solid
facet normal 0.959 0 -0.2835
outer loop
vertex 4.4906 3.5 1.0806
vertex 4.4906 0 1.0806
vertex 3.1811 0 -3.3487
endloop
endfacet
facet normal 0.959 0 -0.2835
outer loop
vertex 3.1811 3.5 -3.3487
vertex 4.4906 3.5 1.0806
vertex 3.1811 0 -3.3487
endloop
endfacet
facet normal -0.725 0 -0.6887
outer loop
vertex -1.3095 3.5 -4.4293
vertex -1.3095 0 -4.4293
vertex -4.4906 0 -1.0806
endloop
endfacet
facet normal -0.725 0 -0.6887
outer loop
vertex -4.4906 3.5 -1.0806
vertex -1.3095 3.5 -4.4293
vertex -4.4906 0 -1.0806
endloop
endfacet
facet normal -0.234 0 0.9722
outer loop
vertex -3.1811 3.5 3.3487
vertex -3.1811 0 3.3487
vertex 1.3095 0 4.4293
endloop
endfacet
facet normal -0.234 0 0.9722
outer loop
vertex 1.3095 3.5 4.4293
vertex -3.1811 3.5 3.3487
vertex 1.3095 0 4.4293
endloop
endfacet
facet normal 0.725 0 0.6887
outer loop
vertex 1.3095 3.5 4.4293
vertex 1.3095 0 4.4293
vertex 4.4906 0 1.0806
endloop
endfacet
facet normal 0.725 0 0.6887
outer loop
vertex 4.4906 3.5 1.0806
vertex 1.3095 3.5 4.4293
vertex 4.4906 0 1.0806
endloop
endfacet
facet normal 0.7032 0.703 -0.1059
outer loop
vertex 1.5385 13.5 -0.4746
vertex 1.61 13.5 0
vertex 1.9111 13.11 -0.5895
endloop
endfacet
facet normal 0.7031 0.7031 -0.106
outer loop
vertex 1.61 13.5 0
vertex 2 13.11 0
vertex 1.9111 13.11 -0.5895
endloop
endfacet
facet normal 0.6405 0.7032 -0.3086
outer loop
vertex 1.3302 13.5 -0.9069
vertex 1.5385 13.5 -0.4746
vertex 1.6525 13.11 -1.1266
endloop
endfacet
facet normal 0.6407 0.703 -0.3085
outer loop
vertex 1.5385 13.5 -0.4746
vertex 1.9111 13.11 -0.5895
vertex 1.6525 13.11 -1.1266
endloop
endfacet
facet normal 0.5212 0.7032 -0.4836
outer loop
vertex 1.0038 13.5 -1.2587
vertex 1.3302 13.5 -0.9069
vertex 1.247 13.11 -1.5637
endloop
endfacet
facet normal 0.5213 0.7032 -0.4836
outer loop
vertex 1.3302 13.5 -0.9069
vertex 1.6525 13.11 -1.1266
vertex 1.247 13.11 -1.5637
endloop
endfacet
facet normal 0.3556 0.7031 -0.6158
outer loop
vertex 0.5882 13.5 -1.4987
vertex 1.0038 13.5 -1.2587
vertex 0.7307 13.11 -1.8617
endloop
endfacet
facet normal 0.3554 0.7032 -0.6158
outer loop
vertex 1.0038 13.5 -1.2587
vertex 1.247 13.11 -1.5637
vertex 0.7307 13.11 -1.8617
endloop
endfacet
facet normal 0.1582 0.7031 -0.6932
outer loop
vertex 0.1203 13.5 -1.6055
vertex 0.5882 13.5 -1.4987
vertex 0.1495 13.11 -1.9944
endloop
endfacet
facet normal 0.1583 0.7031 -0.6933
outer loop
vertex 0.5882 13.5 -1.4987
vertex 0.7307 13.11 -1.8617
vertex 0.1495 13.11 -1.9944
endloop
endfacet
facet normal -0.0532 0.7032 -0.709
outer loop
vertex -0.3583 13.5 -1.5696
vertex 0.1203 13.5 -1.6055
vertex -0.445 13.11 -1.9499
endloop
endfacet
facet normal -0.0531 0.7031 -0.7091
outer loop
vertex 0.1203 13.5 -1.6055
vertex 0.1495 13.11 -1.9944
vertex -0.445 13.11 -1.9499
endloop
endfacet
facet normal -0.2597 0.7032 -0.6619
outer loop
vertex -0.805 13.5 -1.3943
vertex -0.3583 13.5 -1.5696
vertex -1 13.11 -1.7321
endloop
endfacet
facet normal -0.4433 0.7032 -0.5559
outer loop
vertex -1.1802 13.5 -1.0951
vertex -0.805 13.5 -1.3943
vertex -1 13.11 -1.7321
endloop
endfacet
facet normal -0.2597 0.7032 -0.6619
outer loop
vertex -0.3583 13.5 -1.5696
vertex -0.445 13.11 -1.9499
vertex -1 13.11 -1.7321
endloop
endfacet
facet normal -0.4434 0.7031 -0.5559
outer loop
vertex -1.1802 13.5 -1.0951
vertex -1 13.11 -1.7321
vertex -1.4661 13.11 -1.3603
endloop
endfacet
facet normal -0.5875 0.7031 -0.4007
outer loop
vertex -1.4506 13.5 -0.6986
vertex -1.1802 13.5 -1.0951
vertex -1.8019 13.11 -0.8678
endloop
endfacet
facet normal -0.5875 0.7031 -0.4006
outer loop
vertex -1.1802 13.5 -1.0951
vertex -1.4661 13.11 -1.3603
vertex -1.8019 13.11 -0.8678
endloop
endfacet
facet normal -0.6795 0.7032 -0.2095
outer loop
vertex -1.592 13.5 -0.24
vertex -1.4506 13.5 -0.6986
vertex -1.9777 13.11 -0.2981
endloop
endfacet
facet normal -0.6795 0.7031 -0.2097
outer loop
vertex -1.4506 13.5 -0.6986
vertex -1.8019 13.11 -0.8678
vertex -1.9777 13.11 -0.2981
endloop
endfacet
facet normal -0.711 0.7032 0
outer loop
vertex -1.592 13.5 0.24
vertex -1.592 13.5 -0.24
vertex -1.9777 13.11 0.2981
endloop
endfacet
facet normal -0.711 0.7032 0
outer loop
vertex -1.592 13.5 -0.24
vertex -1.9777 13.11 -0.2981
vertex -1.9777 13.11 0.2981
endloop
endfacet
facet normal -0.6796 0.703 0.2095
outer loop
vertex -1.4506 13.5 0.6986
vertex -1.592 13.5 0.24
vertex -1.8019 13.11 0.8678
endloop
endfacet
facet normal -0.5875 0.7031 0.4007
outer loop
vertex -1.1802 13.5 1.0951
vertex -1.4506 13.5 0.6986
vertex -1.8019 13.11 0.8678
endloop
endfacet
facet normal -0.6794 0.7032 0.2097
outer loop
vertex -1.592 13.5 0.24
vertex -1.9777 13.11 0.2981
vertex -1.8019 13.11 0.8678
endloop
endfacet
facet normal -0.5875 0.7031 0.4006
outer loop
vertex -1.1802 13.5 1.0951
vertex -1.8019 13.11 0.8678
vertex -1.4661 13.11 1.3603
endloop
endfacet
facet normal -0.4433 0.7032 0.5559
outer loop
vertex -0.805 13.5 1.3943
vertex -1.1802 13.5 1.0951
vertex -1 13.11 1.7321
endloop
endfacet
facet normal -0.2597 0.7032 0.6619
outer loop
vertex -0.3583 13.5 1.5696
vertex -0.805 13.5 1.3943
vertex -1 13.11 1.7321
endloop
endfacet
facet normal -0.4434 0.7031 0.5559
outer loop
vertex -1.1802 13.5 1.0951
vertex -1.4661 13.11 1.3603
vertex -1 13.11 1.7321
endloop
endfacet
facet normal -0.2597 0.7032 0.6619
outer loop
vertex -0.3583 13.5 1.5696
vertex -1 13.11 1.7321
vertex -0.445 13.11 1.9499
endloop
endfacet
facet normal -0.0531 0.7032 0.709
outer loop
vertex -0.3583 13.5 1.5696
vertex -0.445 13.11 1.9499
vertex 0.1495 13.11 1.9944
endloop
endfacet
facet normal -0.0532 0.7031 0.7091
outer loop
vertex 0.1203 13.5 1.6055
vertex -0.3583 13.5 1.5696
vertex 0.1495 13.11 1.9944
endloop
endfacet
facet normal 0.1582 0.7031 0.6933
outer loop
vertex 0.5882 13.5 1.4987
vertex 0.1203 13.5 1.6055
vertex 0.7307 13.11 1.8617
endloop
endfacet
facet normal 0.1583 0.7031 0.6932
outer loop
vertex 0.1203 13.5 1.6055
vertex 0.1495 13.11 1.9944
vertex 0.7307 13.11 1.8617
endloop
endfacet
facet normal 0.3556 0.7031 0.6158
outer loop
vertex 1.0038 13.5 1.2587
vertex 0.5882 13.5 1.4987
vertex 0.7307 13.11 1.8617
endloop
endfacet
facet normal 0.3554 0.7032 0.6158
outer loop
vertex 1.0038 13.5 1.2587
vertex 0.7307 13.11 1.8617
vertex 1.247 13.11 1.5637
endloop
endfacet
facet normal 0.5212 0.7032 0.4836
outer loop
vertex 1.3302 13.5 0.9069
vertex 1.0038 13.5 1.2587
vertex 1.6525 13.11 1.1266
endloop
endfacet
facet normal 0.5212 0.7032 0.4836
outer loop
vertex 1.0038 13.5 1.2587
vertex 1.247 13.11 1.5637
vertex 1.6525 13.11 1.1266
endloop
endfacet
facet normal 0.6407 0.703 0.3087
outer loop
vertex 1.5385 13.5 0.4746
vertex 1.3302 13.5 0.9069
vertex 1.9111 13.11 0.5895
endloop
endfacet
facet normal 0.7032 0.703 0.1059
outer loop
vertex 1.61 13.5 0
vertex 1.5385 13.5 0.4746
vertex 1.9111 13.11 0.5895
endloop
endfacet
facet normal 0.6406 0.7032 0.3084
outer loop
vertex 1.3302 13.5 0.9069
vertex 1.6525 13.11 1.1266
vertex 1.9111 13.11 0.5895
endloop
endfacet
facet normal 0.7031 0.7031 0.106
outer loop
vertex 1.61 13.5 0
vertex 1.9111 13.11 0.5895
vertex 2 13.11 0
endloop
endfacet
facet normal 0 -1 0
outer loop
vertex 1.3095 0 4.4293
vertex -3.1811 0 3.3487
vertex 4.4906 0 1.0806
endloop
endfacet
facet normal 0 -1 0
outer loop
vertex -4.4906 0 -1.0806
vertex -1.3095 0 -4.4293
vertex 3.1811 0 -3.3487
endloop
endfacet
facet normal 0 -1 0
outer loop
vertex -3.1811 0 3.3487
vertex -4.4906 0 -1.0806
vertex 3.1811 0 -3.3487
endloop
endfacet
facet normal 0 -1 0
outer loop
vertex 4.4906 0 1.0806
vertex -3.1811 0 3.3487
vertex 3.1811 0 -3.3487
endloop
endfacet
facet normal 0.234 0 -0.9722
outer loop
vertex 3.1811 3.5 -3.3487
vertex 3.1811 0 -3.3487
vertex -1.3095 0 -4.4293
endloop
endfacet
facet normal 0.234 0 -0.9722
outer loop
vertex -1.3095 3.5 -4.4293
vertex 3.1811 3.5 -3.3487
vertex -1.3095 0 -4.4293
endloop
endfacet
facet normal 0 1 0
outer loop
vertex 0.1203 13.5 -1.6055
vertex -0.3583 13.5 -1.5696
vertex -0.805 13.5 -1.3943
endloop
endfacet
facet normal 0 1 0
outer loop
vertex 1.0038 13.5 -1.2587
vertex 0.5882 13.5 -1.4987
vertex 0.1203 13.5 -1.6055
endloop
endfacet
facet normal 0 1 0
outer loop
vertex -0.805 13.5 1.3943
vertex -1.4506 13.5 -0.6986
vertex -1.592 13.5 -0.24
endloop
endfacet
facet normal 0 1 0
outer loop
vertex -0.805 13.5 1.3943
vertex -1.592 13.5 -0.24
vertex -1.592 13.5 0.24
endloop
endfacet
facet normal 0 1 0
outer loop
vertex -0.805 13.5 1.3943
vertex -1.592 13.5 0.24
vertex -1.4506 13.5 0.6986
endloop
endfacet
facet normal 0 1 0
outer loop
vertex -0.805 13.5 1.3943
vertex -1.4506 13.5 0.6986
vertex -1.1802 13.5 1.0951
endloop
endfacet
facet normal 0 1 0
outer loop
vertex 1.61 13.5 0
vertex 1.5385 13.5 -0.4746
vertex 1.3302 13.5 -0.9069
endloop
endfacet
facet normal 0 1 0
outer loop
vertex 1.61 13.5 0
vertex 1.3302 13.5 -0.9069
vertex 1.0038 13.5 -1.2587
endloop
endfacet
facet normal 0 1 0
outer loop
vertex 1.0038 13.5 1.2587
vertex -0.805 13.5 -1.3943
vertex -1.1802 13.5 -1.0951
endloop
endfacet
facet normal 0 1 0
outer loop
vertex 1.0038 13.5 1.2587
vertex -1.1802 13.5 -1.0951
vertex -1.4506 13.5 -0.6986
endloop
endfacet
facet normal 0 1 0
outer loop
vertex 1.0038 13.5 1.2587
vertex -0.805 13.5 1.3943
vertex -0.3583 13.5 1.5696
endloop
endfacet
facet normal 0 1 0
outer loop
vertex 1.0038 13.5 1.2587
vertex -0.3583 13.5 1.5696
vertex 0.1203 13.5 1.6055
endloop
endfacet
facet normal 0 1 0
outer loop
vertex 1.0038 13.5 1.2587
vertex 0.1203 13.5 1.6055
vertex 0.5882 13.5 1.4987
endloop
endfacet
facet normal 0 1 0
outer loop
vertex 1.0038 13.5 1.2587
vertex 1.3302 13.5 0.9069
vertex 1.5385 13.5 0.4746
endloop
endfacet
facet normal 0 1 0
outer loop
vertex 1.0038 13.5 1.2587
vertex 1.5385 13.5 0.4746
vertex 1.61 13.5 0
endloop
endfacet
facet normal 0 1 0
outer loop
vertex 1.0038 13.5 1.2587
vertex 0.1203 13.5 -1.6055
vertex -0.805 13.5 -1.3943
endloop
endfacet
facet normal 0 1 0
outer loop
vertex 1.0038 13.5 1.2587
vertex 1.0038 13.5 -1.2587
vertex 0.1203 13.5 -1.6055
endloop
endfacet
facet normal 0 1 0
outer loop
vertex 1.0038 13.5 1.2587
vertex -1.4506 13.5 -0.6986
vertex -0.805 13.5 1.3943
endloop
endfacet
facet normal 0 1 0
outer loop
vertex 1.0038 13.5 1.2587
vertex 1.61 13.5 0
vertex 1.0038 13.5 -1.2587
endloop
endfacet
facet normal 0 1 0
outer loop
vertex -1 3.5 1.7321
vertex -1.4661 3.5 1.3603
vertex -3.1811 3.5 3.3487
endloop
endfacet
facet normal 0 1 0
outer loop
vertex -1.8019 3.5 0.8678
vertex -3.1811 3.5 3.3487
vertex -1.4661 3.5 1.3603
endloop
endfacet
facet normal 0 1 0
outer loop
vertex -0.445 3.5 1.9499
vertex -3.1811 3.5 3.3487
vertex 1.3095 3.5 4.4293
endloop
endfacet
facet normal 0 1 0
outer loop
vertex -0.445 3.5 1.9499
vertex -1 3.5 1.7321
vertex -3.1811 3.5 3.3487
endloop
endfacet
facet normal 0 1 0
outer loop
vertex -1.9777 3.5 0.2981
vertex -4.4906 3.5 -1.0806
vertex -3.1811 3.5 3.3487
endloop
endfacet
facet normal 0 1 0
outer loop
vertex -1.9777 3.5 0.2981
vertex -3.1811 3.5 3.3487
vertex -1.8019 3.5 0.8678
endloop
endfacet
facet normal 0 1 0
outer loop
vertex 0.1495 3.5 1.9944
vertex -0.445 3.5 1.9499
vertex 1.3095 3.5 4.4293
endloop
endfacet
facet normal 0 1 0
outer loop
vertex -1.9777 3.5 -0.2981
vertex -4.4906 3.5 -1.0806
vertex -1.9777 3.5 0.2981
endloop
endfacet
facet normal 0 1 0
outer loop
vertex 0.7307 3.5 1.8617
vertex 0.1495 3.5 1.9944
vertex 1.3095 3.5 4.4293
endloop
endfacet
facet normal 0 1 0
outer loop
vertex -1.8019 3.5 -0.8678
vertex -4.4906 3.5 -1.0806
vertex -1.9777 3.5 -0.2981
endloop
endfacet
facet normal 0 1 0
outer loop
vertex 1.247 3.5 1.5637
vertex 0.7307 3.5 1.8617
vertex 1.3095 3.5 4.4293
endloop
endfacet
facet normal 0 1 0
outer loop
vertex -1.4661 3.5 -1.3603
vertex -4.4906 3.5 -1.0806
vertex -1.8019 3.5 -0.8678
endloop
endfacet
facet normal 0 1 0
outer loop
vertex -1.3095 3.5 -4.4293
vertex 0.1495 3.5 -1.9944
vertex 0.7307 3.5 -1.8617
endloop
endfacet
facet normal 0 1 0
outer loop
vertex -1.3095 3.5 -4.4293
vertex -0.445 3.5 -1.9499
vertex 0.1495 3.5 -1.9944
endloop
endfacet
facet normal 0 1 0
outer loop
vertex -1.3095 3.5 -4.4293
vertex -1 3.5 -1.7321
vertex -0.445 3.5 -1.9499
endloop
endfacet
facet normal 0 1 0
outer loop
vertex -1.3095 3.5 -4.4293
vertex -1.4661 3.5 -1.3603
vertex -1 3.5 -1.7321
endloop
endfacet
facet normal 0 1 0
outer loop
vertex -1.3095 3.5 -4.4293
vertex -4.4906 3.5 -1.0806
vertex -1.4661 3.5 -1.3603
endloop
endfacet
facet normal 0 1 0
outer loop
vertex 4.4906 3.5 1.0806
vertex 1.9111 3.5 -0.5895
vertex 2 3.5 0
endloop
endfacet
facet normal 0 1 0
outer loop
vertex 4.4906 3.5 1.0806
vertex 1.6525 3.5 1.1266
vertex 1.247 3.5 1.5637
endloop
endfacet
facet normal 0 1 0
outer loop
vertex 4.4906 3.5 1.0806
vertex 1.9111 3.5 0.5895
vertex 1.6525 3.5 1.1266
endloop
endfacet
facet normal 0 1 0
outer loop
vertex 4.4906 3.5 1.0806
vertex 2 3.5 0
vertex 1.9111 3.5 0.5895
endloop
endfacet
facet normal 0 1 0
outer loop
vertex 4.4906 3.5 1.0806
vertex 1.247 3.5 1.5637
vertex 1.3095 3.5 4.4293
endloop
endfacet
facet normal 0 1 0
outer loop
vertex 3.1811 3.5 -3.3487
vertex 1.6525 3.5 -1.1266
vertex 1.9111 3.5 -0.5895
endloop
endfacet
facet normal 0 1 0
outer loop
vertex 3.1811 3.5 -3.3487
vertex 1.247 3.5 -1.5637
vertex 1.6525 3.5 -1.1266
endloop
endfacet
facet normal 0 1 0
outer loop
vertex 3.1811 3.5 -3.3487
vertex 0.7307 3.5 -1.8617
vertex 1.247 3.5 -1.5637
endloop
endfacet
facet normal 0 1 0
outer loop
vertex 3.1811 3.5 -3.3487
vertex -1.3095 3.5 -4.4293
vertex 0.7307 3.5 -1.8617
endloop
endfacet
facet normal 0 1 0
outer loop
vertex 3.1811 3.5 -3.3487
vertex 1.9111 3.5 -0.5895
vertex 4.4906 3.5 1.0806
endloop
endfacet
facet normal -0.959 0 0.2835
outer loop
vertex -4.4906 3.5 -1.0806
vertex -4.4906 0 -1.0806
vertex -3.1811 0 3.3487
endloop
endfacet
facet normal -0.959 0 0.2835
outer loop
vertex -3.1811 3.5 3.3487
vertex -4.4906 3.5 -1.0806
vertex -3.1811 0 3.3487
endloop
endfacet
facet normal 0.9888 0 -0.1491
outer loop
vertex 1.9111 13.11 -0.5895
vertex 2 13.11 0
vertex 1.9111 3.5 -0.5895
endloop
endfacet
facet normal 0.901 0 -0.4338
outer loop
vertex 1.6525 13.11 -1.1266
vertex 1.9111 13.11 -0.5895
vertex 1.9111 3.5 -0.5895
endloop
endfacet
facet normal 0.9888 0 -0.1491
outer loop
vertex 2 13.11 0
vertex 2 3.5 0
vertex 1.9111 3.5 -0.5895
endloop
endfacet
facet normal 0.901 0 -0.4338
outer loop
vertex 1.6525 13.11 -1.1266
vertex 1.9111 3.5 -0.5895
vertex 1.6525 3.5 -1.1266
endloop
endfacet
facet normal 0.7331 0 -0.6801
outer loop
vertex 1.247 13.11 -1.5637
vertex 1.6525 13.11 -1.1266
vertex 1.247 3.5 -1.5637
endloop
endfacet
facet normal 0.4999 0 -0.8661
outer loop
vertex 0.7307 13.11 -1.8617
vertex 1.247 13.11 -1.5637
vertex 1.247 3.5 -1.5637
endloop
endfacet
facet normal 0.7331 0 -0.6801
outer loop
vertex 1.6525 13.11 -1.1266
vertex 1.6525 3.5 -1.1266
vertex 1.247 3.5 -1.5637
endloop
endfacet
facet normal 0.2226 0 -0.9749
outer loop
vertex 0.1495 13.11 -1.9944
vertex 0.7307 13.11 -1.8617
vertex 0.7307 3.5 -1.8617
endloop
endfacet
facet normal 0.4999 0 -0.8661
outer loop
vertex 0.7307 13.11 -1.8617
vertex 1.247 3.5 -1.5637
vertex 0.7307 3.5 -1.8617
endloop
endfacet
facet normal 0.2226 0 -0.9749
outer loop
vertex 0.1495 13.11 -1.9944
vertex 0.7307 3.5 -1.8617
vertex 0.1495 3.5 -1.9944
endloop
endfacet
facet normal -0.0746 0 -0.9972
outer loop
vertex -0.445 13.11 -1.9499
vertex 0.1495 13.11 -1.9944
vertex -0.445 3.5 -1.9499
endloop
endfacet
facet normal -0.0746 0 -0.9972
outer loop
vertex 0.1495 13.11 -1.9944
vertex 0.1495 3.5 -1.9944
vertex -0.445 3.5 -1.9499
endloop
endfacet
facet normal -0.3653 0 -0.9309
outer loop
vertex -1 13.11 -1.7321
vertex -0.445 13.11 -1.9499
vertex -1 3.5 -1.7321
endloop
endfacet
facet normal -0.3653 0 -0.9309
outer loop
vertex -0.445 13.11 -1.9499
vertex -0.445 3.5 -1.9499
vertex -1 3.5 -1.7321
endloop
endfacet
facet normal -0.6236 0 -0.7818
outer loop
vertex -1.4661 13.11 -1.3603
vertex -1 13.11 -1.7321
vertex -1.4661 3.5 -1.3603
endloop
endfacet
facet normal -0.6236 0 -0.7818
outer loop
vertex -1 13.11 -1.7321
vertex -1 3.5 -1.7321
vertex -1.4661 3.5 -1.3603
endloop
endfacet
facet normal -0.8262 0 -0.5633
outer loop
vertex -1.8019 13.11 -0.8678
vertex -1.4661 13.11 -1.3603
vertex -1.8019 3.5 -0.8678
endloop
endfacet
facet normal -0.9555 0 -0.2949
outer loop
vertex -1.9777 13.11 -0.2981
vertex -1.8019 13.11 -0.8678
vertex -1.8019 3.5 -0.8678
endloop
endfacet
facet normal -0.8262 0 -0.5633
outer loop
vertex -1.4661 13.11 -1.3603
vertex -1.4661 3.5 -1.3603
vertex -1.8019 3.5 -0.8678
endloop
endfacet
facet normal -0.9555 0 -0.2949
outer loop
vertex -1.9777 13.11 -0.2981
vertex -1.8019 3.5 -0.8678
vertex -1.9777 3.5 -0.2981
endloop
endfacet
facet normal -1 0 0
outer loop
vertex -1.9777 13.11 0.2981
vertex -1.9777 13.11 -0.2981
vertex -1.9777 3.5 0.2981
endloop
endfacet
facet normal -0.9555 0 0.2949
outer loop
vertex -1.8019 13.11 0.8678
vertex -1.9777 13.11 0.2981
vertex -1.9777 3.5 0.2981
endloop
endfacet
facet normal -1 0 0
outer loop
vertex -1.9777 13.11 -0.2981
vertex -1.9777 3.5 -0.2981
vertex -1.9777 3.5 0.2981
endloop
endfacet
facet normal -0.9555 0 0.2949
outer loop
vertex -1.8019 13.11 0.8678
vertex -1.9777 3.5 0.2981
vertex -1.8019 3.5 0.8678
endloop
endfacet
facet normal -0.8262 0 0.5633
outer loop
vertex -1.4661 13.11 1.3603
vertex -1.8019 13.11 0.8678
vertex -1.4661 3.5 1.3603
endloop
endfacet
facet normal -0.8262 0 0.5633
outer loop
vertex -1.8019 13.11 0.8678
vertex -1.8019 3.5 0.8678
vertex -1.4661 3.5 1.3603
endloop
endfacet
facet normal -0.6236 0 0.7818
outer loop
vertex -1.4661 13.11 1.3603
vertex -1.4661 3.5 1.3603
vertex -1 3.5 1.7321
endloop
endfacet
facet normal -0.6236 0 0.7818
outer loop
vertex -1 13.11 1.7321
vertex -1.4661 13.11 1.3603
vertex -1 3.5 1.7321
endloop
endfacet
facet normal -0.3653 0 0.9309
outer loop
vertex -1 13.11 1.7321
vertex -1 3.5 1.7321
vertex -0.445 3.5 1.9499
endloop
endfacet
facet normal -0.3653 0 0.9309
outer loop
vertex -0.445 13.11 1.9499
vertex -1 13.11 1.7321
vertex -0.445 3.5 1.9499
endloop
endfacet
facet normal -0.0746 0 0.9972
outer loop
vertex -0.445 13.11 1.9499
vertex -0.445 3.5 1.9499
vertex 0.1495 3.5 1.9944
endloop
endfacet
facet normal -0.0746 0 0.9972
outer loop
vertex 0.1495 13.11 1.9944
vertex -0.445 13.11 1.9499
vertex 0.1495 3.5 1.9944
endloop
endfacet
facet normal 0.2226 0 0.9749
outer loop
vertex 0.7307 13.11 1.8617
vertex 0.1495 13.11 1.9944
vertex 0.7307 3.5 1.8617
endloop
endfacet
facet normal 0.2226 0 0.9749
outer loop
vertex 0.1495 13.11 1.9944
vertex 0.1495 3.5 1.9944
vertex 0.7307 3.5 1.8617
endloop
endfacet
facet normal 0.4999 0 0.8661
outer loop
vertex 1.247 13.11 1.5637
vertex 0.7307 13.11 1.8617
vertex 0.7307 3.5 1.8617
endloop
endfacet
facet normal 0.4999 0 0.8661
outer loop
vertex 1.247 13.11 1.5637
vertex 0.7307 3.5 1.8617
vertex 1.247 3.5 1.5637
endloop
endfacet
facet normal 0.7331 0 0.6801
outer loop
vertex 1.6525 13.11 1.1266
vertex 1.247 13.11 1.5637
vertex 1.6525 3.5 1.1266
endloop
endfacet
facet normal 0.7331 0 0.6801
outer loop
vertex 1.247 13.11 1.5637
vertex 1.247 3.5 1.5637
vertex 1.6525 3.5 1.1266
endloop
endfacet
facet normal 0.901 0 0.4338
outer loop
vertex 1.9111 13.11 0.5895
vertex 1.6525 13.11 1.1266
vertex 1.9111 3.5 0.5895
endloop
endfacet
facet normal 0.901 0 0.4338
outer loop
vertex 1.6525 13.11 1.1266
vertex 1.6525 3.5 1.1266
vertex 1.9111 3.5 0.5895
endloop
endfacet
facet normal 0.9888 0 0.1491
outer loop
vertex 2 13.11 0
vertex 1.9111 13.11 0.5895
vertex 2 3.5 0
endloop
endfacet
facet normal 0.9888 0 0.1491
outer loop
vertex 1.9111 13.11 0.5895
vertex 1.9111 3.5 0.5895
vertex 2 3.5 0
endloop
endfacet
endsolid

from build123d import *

# Parameters (mm, degrees)
EXTRUDE_1_DEPTH = 3.5
SKETCH_2_R      = 2.5
EXTRUDE_2_DEPTH = 10


# Read off the part's stored shape, not the designer's step: M4x0.7 Машинная резьба Шпилька1
with BuildPart() as part:
    # Эскиз1 → Бобышка-Вытянуть1 (new body)
    with BuildSketch(Plane(origin=(0, 0, 0), x_dir=(1, 0, 0), z_dir=(0, 1, 0))):
        Polygon((1.309524818, -4.42927512), (4.490627183, -1.080555801), (3.181102365, 3.348719319), (-1.309524818, 4.42927512), (-4.490627183, 1.080555801), (-3.181102365, -3.348719319), align=None)
    extrude(amount=EXTRUDE_1_DEPTH)

    # Эскиз2 → Бобышка-Вытянуть2 (add)
    with BuildSketch(Plane(origin=(0, 3.5, 0), x_dir=(1, 0, 0), z_dir=(0, 1, 0))):
        with Locations(Location((0, 0, 0), (0, 0, 270))):
            Circle(SKETCH_2_R)
    extrude(amount=EXTRUDE_2_DEPTH)

    # M4x0.7 Машинная резьба Шпилька1 outline → M4x0.7 Машинная резьба Шпилька1 (revolve, cut)
    with BuildSketch(Plane.XY):
        Polygon((2, 13.11), (2, 3.5), (2.5, 3.5), (2.5, 13.5), (1.61, 13.5), align=None)
    revolve(axis=Axis((0, 0, 0), (0, 1, 0)), mode=Mode.SUBTRACT)


solid = part.part
